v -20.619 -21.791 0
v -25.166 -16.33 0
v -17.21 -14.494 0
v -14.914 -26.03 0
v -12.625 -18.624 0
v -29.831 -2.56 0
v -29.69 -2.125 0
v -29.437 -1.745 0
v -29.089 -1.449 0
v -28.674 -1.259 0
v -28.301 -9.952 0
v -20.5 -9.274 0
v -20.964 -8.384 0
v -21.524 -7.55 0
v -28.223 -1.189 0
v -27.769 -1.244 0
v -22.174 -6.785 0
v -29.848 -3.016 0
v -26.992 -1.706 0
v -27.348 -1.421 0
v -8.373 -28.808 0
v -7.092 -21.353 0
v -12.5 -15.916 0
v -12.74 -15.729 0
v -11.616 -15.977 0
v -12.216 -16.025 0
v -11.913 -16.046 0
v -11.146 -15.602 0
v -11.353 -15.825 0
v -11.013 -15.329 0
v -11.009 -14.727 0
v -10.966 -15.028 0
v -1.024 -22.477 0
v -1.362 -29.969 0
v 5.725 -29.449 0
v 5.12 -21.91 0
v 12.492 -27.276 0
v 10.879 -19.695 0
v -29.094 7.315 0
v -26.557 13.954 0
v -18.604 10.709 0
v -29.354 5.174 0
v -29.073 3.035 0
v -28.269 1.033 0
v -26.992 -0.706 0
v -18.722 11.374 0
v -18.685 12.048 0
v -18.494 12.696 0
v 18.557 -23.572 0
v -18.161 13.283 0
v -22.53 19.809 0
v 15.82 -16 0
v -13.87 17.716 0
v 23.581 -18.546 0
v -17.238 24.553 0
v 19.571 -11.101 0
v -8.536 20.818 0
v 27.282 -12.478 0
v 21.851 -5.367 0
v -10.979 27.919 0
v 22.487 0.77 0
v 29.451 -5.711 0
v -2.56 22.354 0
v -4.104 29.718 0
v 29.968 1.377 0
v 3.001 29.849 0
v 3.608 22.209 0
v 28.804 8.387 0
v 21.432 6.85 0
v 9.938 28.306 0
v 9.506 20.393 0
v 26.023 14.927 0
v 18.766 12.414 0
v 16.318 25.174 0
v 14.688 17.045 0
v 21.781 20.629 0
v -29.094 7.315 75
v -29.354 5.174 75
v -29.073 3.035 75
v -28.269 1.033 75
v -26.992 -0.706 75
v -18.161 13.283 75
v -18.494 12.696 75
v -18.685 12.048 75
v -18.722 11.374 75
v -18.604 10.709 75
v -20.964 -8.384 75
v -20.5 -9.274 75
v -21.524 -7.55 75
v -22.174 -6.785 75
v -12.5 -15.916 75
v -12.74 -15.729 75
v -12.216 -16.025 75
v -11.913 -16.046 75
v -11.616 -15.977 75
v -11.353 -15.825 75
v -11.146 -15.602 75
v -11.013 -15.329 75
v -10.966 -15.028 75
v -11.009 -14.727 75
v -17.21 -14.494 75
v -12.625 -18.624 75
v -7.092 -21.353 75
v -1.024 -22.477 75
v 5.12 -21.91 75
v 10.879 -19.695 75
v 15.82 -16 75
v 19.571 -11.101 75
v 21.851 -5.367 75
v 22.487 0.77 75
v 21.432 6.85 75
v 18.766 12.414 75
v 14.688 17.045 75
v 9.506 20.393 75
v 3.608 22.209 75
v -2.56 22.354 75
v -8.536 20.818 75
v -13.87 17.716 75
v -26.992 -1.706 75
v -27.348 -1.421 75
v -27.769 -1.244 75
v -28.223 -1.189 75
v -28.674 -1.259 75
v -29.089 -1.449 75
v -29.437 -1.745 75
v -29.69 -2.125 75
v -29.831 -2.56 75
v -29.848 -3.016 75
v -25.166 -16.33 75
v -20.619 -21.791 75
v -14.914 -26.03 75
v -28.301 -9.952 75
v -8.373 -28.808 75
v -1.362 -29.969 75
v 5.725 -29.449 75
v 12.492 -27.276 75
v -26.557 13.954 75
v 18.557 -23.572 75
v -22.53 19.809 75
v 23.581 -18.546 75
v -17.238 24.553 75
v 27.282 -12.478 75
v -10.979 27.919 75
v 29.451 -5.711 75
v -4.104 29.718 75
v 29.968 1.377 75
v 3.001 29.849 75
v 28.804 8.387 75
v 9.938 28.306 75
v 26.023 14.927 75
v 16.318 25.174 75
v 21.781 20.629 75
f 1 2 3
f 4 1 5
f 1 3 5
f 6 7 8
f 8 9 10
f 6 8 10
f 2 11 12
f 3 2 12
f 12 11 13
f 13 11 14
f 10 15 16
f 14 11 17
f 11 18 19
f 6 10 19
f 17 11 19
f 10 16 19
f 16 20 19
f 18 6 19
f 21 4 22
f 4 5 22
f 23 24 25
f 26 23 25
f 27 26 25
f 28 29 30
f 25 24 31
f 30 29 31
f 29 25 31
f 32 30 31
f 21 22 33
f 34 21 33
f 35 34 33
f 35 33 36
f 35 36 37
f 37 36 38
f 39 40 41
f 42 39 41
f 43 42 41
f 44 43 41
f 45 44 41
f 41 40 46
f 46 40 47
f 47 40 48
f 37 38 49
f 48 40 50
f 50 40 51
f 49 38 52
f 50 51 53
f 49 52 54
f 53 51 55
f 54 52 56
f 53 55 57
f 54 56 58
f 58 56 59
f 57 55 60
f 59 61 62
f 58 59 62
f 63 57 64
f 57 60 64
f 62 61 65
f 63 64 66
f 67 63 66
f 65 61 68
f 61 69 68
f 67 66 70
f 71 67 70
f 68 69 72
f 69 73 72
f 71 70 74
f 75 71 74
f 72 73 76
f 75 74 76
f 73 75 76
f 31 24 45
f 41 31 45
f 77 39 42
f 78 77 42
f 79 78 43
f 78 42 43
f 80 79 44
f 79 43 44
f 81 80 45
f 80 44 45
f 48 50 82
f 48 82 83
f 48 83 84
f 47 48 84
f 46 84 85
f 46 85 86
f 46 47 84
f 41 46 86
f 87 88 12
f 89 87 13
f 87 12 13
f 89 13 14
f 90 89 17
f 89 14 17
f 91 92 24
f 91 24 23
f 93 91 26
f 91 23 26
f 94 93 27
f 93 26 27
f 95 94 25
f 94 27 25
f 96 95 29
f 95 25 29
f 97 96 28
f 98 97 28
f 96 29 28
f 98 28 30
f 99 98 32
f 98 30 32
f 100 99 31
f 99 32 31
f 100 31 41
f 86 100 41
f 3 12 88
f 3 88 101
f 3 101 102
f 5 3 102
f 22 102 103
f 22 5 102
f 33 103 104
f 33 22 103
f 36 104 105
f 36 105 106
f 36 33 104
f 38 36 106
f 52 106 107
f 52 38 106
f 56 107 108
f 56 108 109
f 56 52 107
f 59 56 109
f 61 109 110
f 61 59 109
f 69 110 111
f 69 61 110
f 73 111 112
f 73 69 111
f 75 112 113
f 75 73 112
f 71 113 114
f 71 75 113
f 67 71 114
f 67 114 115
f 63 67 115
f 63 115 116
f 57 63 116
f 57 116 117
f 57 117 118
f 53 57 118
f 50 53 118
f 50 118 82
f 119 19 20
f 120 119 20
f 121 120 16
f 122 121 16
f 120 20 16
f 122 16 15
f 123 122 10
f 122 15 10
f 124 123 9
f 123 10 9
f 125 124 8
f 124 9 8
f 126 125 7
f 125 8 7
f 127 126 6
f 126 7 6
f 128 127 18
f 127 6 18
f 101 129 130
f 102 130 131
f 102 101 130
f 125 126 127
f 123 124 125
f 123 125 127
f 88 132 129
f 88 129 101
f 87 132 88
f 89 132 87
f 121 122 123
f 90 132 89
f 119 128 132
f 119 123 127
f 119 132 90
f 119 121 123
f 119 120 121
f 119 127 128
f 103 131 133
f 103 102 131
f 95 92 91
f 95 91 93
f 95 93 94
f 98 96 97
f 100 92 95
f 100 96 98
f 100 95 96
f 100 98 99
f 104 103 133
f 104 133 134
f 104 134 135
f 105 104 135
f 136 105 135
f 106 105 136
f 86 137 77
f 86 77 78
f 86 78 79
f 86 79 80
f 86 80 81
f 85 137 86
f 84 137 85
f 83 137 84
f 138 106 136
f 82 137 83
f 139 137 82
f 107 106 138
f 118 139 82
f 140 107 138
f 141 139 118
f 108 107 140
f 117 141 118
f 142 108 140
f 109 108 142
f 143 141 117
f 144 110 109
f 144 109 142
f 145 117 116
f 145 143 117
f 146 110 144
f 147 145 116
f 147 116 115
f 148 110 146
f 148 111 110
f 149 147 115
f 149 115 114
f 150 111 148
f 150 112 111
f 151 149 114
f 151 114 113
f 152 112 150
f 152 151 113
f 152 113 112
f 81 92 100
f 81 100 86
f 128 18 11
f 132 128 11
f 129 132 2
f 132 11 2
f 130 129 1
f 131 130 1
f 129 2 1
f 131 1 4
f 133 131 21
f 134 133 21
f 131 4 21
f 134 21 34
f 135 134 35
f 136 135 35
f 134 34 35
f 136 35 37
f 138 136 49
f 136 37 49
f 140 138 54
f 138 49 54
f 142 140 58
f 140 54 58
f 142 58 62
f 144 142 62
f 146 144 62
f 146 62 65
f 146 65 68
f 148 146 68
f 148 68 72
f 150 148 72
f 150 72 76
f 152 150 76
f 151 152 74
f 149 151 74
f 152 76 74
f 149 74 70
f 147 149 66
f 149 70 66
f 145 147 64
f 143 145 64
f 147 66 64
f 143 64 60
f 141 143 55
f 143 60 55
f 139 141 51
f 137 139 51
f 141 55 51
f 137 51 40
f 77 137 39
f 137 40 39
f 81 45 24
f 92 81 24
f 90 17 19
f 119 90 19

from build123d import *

# Parameters (mm, degrees)
PAD_DEPTH = 75


with BuildPart() as part:
    # Sketch → Pad (new body)
    with BuildSketch(Plane.XY):
        with BuildLine():
            ThreePointArc((-29.848016, -3.015947), (29.920505, -2.182515), (-29.094406, 7.315431))
            ThreePointArc((-29.094406, 7.315431), (-29.072912, 3.034578), (-26.991574, -0.706304))
            Line((-26.991574, -0.706304), (-12.739759, -15.728805))
            ThreePointArc((-12.739759, -15.728805), (-11.4789, -15.911046), (-11.008743, -14.727014))
            Line((-11.008743, -14.727014), (-18.604437, 10.709188))
            ThreePointArc((-18.160969, 13.282665), (-18.684551, 12.047942), (-18.604437, 10.709188))
            ThreePointArc((-20.499669, -9.27435), (22.380035, -2.320351), (-18.160969, 13.282665))
            ThreePointArc((-20.499669, -9.27435), (-21.232479, -7.959372), (-22.173804, -6.784601))
            Line((-22.173804, -6.784601), (-26.991574, -1.706304))
            ThreePointArc((-26.991574, -1.706304), (-28.888073, -1.339771), (-29.848016, -3.015947))
        make_face()
    extrude(amount=PAD_DEPTH)


solid = part.part
